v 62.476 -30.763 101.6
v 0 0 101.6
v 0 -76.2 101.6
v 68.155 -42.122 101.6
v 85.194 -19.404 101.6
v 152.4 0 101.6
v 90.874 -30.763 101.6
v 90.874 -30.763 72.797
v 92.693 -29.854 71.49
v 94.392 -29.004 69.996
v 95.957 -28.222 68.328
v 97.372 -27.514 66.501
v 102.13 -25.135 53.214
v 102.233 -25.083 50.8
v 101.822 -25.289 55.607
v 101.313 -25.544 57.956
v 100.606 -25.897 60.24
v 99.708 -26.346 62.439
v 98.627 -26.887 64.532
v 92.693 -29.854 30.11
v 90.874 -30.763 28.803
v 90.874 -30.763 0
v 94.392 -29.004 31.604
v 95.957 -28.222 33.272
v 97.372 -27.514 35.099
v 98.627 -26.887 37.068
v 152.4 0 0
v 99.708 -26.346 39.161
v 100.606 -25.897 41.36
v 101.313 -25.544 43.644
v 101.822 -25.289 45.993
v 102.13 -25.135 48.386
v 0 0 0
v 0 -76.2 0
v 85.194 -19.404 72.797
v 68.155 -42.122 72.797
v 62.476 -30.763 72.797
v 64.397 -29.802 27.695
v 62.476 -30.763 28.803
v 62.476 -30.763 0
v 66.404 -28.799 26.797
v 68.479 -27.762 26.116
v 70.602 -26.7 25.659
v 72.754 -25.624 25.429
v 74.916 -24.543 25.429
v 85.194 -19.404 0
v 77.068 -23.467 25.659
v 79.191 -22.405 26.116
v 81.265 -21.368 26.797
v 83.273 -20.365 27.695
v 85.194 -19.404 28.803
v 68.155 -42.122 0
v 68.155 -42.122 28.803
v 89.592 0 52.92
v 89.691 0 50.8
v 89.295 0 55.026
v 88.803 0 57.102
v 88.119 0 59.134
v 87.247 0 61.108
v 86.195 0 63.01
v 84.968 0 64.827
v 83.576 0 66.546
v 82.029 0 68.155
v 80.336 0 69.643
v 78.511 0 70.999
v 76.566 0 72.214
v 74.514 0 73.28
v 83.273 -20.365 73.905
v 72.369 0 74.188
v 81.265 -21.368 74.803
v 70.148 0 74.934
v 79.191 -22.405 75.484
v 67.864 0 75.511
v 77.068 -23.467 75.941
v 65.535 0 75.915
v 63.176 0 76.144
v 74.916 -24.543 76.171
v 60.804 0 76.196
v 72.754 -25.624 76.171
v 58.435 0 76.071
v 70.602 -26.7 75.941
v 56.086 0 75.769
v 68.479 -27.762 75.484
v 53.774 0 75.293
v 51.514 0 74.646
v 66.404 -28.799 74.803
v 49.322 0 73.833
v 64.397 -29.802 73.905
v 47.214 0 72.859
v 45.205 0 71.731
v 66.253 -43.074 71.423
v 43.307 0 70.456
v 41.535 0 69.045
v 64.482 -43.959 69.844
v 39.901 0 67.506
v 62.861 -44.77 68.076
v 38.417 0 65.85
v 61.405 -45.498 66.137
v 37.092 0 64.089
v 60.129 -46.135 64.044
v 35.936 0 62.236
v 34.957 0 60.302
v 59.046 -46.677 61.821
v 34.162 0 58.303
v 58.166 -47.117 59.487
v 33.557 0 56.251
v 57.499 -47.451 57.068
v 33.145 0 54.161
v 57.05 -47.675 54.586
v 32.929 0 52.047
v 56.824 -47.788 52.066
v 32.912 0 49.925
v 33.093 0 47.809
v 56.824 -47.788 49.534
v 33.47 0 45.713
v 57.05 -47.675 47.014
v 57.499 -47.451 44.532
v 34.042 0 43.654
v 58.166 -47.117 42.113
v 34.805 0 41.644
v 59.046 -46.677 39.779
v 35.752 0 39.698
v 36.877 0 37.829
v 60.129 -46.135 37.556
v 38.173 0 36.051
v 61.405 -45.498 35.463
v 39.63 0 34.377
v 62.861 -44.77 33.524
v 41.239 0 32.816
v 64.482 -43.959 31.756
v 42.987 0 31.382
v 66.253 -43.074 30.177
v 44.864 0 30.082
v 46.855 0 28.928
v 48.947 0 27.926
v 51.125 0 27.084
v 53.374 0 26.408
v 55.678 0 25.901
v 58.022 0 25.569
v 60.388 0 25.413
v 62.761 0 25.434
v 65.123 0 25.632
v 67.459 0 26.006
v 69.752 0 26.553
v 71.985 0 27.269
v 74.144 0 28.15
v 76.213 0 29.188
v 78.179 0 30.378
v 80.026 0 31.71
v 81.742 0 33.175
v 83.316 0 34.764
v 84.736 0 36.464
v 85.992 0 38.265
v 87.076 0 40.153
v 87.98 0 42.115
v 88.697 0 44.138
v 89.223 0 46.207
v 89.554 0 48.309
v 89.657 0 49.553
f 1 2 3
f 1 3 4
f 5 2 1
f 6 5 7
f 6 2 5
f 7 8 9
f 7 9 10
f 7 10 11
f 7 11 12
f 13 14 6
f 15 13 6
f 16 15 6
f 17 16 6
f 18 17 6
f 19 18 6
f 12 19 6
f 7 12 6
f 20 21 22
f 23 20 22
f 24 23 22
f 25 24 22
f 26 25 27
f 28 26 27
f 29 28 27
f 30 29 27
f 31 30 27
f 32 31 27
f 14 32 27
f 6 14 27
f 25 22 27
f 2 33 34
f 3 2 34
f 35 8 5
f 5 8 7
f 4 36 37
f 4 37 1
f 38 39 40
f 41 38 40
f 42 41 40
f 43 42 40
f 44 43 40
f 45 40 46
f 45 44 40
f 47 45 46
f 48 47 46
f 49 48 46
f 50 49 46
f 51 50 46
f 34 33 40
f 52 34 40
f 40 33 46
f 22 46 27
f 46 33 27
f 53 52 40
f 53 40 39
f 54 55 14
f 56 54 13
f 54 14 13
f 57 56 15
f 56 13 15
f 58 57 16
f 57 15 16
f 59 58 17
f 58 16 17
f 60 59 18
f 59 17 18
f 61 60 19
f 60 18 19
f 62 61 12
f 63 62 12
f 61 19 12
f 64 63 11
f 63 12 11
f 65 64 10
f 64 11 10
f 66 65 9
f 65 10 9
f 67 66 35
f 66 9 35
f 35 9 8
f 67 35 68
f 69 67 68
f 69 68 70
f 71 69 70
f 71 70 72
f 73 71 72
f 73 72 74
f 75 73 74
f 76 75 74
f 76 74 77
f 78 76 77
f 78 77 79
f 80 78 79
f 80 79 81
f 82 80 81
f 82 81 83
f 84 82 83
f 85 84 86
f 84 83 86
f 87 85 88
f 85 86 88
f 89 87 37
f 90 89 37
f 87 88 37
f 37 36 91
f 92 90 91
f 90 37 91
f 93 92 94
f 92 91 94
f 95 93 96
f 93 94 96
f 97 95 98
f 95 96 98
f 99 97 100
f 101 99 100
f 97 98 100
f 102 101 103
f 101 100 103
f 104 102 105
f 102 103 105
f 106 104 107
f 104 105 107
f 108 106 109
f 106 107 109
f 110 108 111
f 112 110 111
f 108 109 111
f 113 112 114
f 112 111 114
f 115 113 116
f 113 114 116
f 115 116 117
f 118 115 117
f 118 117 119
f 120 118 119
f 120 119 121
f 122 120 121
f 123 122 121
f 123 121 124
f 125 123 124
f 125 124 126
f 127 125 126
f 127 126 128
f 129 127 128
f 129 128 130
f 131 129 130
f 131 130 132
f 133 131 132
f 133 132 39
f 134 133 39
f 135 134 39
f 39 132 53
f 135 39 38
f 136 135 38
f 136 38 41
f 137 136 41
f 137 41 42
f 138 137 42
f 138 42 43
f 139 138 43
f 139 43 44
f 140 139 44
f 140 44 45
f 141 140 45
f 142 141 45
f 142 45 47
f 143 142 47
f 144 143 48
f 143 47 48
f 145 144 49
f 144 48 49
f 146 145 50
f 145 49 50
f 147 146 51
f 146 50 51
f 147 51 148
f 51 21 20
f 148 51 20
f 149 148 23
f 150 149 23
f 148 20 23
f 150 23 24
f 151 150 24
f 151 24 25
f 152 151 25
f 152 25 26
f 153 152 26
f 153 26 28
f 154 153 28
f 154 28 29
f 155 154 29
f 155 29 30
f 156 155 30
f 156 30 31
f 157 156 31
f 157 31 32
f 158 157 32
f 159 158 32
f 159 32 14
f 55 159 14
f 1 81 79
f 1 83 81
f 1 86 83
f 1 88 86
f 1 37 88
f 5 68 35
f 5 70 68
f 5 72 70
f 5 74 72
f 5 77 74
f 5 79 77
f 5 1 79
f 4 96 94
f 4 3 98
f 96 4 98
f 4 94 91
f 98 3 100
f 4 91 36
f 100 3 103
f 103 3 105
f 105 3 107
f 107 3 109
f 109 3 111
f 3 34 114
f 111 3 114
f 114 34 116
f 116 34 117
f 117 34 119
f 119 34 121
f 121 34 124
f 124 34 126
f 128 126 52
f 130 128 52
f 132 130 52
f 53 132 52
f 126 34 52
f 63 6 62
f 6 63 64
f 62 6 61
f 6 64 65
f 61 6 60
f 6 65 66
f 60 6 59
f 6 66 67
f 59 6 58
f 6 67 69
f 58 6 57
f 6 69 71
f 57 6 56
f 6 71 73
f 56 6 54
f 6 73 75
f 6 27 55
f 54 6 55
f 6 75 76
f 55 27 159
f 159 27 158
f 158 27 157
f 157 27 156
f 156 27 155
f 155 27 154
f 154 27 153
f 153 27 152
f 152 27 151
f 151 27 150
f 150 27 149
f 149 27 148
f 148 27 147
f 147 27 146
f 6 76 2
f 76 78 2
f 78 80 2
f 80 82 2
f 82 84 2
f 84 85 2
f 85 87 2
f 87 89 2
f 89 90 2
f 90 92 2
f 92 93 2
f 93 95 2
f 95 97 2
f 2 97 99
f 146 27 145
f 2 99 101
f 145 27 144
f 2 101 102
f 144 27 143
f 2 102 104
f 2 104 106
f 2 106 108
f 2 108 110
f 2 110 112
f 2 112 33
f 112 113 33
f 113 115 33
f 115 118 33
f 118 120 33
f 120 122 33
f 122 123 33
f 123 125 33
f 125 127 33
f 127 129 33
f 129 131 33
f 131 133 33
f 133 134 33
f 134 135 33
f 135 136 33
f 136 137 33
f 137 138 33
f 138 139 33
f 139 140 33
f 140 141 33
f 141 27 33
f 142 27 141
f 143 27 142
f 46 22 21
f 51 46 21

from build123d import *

# Parameters (mm, degrees)
F1_DEPTH = 101.6
F2_W     = 25.4
F2_H     = 101.6
F3_DEPTH = 12.7
F4_R     = 25.4
F5_DEPTH = 25.4
F6_DEPTH = 192.786


with BuildPart() as f1:
    # F0 (on Top) → F1 (new body)
    with BuildSketch(Plane.XY):
        Polygon((152.4, 0), (0, 0), (0, -76.2), align=None)
    extrude(amount=F1_DEPTH)

    # F2 (on face) → F3 (cut)
    with BuildSketch(Plane(origin=(30.48, -60.96, 0), x_dir=(0.894427191, 0.4472135955, 0), z_dir=(0.4472135955, -0.894427191, 0))):
        with Locations((54.8223240229, 50.8)):
            Rectangle(F2_W, F2_H)
    extrude(amount=-F3_DEPTH, mode=Mode.SUBTRACT)

    # F4 (on face) → F5 (join)
    with BuildSketch(Plane(origin=(30.48, -60.96, 0), x_dir=(0.894427191, 0.4472135955, 0), z_dir=(0.4472135955, -0.894427191, 0))):
        with Locations((54.8223240229, 50.8)):
            Circle(F4_R)
    extrude(amount=F5_DEPTH)

    # F6 (cut): a face of the model
    f6_faces = [f1.faces().sort_by_distance(p)[0] for p in [
        (90.8738026056, -59.1611620115, 50.8),
    ]]
    extrude(f6_faces, amount=-F6_DEPTH, mode=Mode.SUBTRACT)


solid = f1.part
